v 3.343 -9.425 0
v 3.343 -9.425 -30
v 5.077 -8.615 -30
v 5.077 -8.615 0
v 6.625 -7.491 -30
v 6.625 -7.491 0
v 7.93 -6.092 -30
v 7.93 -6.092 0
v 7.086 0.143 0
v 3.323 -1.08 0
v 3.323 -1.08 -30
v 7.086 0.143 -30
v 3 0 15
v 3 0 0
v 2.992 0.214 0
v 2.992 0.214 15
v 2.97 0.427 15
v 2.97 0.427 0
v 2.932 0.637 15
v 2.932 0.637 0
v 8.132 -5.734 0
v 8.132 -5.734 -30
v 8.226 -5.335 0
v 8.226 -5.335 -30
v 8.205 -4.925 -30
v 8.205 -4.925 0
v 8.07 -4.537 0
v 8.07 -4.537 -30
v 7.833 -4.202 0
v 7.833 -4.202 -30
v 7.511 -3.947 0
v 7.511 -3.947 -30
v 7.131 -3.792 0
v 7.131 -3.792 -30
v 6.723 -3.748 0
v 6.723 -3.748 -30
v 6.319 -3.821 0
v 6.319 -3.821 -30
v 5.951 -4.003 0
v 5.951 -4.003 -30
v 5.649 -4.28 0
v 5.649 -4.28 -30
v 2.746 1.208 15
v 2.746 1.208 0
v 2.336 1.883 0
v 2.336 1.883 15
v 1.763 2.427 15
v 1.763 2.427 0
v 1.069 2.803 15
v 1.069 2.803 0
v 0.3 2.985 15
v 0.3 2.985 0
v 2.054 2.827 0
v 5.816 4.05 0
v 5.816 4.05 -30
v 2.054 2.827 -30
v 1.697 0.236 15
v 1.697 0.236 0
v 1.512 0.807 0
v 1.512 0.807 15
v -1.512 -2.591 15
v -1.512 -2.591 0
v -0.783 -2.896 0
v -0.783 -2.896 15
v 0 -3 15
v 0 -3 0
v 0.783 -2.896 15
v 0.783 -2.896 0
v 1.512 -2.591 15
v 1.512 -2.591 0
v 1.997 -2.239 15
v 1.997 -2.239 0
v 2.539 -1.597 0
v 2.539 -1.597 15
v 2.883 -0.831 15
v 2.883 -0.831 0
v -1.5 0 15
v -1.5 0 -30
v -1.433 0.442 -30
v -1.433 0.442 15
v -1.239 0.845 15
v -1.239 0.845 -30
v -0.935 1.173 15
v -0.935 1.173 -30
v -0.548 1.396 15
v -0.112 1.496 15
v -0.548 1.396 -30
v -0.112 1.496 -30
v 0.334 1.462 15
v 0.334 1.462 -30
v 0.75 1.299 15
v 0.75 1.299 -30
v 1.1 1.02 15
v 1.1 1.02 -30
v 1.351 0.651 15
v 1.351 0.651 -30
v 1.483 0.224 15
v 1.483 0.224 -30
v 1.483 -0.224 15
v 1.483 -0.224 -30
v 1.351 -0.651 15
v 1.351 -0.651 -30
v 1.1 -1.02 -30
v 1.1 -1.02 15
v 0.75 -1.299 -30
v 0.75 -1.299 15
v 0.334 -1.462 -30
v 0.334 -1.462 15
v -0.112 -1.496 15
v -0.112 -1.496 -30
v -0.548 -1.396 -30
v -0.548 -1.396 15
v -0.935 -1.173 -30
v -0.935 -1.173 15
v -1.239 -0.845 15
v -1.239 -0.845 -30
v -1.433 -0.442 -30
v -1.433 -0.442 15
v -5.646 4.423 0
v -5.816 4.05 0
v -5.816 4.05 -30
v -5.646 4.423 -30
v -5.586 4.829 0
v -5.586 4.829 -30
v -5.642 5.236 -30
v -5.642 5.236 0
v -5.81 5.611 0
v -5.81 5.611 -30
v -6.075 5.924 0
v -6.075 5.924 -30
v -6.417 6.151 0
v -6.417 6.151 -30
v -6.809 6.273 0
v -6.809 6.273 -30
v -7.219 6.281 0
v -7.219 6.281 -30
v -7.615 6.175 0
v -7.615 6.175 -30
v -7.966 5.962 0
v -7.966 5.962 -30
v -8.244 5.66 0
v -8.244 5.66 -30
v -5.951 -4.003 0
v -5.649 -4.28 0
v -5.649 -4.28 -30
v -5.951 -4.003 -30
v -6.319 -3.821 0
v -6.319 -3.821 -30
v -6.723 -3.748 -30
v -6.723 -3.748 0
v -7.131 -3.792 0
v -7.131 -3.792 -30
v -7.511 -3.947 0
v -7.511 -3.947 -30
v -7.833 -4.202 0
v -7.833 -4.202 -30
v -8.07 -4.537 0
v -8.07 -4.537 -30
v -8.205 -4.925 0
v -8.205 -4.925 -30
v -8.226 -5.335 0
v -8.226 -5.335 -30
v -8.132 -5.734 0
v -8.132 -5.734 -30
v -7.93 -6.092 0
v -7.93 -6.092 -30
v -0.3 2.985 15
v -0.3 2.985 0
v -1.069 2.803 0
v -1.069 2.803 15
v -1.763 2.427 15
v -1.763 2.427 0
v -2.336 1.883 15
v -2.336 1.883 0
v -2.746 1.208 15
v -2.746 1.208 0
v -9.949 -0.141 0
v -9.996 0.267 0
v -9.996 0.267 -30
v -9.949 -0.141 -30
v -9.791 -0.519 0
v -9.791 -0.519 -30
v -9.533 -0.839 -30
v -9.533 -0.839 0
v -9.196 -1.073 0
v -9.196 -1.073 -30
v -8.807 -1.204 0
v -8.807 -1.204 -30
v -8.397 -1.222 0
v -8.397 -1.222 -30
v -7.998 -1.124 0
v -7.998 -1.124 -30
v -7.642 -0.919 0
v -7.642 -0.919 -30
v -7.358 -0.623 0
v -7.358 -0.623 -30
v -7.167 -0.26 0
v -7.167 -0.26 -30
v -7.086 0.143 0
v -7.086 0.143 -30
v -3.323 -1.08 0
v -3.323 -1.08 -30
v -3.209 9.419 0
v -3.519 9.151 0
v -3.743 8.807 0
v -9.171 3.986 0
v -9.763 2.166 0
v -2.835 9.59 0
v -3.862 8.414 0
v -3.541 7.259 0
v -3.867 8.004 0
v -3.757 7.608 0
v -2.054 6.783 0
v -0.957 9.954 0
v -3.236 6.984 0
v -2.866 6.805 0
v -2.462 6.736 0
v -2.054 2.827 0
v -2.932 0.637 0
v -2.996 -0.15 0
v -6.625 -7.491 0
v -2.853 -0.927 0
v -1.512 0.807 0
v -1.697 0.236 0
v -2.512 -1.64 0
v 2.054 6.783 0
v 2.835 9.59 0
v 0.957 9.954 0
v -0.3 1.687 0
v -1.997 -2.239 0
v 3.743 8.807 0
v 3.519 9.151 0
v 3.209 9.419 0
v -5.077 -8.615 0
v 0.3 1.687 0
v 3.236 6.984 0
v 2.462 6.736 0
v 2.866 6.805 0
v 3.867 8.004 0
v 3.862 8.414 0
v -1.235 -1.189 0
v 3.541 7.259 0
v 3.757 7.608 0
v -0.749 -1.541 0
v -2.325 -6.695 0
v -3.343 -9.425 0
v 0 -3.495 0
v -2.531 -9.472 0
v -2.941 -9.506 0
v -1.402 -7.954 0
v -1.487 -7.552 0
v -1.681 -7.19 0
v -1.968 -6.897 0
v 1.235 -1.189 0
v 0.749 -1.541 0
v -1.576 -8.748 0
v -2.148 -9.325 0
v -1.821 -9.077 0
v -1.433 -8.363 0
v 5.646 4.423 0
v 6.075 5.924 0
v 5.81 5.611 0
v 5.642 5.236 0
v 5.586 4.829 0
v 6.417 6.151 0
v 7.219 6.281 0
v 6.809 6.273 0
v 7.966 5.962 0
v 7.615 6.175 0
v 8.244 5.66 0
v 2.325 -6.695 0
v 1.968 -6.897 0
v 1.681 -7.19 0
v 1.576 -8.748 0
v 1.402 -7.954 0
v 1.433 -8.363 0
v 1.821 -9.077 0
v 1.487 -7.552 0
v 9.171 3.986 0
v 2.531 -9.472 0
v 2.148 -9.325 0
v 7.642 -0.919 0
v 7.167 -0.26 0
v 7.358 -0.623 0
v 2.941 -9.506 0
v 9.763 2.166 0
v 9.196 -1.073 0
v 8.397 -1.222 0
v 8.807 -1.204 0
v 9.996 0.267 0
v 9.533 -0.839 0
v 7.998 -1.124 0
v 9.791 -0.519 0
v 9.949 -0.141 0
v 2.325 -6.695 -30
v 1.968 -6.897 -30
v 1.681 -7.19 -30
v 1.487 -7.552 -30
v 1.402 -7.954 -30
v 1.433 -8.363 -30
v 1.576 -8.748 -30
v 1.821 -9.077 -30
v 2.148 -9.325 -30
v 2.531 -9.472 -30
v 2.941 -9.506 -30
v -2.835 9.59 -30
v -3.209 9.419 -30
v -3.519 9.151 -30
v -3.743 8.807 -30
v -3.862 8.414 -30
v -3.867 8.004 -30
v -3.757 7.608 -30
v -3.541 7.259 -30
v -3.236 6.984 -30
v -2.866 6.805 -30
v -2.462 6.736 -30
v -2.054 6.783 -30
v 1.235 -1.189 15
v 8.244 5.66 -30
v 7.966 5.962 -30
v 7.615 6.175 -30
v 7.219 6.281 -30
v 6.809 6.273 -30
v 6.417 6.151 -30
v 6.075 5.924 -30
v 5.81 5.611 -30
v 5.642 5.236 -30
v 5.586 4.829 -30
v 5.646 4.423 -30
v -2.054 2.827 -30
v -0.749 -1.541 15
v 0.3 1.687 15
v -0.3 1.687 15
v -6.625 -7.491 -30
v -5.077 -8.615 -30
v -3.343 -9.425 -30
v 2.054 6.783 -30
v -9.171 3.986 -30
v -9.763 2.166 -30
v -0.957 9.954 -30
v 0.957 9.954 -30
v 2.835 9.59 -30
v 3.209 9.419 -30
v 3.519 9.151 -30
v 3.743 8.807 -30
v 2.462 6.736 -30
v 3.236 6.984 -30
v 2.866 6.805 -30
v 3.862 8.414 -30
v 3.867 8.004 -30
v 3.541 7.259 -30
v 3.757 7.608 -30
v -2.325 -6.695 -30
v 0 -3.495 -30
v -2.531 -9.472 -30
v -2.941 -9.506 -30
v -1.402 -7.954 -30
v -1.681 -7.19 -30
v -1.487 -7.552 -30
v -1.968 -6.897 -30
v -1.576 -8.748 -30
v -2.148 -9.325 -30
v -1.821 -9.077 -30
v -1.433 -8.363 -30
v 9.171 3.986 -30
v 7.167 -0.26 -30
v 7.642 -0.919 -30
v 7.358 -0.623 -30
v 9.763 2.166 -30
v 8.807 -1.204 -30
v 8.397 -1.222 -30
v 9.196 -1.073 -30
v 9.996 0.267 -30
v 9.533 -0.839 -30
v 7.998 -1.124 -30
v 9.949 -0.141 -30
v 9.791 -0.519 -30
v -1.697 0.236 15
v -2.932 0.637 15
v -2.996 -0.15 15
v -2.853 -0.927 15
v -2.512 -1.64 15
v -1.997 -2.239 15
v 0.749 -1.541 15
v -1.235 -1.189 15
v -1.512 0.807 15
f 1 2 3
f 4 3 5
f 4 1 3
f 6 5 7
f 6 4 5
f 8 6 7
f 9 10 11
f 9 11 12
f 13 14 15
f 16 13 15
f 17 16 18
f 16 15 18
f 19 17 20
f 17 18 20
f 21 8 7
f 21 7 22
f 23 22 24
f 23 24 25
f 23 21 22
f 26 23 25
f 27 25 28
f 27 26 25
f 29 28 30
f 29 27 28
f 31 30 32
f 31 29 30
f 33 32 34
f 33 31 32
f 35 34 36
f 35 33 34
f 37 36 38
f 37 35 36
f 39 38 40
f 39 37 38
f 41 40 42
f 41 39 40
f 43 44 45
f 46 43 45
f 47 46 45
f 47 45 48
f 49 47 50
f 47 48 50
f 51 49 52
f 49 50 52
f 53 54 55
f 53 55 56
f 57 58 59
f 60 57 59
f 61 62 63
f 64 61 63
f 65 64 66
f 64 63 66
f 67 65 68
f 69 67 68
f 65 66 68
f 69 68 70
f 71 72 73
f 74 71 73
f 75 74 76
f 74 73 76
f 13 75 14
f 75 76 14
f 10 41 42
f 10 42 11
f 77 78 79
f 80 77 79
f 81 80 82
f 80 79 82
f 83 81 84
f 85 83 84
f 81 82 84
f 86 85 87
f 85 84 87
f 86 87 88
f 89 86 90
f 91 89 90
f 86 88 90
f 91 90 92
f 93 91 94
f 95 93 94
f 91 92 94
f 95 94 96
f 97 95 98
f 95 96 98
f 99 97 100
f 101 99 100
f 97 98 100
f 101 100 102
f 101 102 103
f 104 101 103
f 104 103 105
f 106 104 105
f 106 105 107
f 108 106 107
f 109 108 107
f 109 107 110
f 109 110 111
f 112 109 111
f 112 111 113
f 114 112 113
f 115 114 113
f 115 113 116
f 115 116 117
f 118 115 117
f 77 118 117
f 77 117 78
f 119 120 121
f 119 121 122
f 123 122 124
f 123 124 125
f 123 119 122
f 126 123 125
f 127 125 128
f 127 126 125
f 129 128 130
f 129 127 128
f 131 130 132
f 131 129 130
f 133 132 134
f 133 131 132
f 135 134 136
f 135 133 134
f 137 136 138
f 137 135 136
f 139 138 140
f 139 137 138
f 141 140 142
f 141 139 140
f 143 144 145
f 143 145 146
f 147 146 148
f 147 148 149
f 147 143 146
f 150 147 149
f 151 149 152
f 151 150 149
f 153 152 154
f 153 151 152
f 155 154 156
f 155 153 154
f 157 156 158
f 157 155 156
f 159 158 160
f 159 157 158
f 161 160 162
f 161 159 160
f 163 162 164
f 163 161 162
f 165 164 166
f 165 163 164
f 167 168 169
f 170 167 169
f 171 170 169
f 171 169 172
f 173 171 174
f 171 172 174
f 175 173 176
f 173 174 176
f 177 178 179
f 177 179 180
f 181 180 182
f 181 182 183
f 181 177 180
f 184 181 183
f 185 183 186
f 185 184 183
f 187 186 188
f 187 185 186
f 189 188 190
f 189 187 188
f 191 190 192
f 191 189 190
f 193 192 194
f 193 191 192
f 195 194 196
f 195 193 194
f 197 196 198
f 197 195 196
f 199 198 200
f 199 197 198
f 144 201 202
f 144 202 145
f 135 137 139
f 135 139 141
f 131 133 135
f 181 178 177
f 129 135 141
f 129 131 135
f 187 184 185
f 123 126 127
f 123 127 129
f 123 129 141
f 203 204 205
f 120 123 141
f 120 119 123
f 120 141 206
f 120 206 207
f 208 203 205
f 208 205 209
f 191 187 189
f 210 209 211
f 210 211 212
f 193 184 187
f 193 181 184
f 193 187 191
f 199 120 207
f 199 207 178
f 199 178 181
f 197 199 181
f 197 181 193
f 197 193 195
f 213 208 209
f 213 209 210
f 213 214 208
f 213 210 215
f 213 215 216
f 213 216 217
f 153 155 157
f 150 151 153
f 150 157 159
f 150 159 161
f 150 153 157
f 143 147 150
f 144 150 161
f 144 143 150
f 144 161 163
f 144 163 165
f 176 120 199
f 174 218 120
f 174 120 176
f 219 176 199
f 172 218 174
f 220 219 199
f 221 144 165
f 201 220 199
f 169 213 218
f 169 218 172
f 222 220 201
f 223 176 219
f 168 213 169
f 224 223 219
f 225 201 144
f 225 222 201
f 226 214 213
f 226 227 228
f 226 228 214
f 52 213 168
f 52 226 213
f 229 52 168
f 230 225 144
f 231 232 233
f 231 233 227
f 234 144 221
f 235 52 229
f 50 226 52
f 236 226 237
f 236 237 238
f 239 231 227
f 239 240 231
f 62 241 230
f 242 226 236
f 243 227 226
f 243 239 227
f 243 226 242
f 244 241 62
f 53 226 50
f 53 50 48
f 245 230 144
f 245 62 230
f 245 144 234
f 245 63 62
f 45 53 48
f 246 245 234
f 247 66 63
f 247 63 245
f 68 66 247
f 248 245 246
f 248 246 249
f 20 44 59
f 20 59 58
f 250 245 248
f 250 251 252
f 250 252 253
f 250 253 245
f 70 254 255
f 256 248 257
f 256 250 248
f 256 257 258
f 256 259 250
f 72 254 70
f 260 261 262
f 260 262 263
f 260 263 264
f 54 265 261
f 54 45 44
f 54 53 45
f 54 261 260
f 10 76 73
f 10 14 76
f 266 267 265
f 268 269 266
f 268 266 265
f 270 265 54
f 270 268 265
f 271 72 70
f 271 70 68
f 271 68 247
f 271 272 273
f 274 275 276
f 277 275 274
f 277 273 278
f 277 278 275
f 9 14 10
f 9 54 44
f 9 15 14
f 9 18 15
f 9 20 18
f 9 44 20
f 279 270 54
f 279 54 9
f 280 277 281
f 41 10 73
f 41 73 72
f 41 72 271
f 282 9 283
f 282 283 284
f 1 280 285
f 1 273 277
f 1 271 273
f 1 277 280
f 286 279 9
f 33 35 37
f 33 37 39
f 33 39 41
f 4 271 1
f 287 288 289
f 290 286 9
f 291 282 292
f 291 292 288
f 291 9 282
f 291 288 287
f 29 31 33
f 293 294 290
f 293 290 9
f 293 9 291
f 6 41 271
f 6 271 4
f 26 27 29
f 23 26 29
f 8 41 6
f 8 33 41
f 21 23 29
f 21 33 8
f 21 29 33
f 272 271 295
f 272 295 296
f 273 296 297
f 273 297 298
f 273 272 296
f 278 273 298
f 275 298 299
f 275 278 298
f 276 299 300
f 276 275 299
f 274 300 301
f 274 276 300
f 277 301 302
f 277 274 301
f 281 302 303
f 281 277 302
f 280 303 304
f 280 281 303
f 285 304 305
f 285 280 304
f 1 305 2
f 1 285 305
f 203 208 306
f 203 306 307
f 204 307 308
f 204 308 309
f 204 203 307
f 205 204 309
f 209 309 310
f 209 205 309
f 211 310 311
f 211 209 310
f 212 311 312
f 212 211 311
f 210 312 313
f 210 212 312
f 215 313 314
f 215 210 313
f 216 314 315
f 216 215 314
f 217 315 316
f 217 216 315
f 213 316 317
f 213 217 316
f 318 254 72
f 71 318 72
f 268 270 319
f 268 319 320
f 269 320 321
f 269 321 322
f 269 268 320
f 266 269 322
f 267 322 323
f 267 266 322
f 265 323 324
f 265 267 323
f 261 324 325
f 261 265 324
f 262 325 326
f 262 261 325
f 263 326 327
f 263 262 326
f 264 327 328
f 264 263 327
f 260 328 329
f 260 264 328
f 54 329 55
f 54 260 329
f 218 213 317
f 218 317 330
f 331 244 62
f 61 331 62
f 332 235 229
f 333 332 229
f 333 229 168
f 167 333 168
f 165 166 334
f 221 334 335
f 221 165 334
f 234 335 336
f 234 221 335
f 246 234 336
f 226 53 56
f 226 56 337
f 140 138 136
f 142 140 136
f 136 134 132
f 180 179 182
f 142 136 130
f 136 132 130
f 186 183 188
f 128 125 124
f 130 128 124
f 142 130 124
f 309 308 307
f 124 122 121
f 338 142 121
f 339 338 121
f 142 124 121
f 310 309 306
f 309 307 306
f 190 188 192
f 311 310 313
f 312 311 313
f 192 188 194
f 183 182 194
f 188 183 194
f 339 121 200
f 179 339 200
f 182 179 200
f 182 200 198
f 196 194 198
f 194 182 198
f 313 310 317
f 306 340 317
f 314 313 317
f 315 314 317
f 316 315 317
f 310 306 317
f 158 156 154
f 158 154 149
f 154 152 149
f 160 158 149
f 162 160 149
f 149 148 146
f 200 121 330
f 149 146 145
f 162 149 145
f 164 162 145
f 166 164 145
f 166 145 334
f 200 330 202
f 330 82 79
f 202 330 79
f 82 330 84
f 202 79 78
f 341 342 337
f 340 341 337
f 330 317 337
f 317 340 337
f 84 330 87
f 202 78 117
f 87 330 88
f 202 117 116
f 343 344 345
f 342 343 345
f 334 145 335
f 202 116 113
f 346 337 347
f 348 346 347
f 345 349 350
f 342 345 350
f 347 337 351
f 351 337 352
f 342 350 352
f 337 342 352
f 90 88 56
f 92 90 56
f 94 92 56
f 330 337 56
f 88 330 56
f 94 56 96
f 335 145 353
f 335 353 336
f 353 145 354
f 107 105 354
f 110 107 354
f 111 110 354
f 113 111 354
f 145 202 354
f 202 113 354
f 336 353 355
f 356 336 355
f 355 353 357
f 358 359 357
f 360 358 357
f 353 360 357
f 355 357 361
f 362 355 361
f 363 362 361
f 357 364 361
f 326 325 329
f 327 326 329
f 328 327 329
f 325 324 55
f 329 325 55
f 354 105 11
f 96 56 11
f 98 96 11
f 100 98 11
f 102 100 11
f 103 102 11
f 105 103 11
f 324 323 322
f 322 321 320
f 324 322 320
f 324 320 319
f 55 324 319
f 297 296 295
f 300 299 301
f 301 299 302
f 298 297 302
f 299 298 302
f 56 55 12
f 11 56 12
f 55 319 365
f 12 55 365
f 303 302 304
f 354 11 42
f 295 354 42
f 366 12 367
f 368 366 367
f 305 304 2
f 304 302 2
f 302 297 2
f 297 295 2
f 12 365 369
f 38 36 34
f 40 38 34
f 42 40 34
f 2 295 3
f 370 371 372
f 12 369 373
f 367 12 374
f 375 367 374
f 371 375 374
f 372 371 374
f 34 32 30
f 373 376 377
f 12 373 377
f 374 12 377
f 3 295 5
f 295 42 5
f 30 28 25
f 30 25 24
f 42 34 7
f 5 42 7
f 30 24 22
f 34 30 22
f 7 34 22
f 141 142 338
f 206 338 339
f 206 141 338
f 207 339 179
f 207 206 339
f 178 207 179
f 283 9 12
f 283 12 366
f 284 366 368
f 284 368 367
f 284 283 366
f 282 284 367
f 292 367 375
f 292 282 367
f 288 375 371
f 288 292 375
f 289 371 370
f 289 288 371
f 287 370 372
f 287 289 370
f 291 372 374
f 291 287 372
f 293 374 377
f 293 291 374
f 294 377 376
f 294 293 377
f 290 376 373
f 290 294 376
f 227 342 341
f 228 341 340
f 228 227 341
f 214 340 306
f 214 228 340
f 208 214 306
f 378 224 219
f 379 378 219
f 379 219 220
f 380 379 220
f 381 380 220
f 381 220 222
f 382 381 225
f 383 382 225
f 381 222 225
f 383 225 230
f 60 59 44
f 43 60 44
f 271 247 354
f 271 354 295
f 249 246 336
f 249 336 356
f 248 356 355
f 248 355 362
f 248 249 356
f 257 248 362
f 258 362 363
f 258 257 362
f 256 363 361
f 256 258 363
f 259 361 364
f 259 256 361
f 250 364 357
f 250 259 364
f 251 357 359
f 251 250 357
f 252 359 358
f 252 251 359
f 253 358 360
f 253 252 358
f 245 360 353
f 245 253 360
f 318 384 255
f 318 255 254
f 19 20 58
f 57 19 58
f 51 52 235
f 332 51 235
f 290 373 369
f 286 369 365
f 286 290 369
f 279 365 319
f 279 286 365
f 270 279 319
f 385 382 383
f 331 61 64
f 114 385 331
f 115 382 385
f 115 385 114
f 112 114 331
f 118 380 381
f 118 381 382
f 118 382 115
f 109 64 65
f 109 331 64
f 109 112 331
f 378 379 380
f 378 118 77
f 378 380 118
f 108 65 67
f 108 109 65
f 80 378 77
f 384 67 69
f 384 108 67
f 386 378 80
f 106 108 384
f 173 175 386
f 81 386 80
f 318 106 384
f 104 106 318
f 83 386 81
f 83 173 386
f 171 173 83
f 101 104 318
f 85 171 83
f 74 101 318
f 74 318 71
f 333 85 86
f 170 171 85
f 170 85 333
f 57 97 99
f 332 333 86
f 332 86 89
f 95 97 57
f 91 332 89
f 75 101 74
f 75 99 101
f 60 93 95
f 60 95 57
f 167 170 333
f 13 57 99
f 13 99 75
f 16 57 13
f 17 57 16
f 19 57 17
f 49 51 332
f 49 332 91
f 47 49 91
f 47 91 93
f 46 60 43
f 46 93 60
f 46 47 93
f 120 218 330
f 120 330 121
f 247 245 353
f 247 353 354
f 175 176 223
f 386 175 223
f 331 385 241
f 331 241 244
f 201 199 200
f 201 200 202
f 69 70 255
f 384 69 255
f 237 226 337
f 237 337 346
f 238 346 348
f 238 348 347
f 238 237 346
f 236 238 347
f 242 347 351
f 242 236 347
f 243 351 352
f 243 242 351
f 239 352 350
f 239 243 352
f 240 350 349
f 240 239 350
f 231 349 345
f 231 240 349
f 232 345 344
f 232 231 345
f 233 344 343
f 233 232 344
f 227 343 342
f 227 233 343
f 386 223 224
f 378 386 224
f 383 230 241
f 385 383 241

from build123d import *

# Parameters (mm, degrees)
BOSS_EXTRUDE3_DEPTH = 30
CIRPATTERN1_COUNT   = 5
BOSS_EXTRUDE4_DEPTH = 15
SKETCH6_R           = 1.5
CUT_EXTRUDE1_DEPTH  = 80


with BuildPart() as part:
    # Sketch2 → Boss-Extrude3 (new body)
    with BuildSketch(Plane.XY):
        with BuildLine():
            Line((-2.054029869, 6.78303703), (-2.054029869, 0))
            Line((-2.054029869, 0), (2.054029869, 0))
            Line((2.054029869, 0), (2.054029869, 6.78303703))
            ThreePointArc((2.054029869, 6.78303703), (3.825708627, 7.801903653), (2.835284544, 9.589638239))
            ThreePointArc((2.835284544, 9.589638239), (0, 10), (-2.835284544, 9.589638239))
            ThreePointArc((-2.835284544, 9.589638239), (-3.825708627, 7.801903653), (-2.054029869, 6.78303703))
        make_face()
    extrude(amount=-BOSS_EXTRUDE3_DEPTH)

    # CirPattern1: part ×5 about axis
    cirpattern1_axis = Axis((0, 0, 0), (0, 0, 1))


with BuildPart() as part_1:
    add(part.part)
    for i in range(1, CIRPATTERN1_COUNT):
        add(part.part.rotate(cirpattern1_axis, i * 360 / CIRPATTERN1_COUNT))

    # Sketch7 → Boss-Extrude4 (add)
    with BuildSketch(Plane.XY):
        with BuildLine():
            Line((0.3, 2.984962311), (0.3, 1.687380928))
            Line((0.3, 1.687380928), (-0.3, 1.687380928))
            Line((-0.3, 1.687380928), (-0.3, 2.984962311))
            ThreePointArc((-0.3, 2.984962311), (-1.763355757, 2.427050983), (-2.746162759, 1.207721037))
            Line((-2.746162759, 1.207721037), (-1.512089528, 0.806746337))
            Line((-1.512089528, 0.806746337), (-1.697499725, 0.236112428))
            Line((-1.697499725, 0.236112428), (-2.931572955, 0.637087127))
            ThreePointArc((-2.931572955, 0.637087127), (-2.853169549, -0.927050983), (-1.997221924, -2.238549662))
            Line((-1.997221924, -2.238549662), (-1.234522723, -1.188784271))
            Line((-1.234522723, -1.188784271), (-0.749112526, -1.541455422))
            Line((-0.749112526, -1.541455422), (-1.511811727, -2.591220813))
            ThreePointArc((-1.511811727, -2.591220813), (0, -3), (1.511811727, -2.591220813))
            Line((1.511811727, -2.591220813), (0.749112526, -1.541455422))
            Line((0.749112526, -1.541455422), (1.234522723, -1.188784271))
            Line((1.234522723, -1.188784271), (1.997221924, -2.238549662))
            ThreePointArc((1.997221924, -2.238549662), (2.737851874, -1.226444909), (3, 0))
            ThreePointArc((3, 0), (2.982844185, 0.320375665), (2.931572955, 0.637087127))
            Line((2.931572955, 0.637087127), (1.697499725, 0.236112428))
            Line((1.697499725, 0.236112428), (1.512089528, 0.806746337))
            Line((1.512089528, 0.806746337), (2.746162759, 1.207721037))
            ThreePointArc((2.746162759, 1.207721037), (1.763355757, 2.427050983), (0.3, 2.984962311))
        make_face()
    extrude(amount=BOSS_EXTRUDE4_DEPTH)

    # Sketch6 → Cut-Extrude1 (cut)
    with BuildSketch(Plane(origin=(0, 0, -30), x_dir=(-1, 0, 0), z_dir=(0, 0, -1))):
        Circle(SKETCH6_R)
    extrude(amount=-CUT_EXTRUDE1_DEPTH, mode=Mode.SUBTRACT)


solid = part_1.part
